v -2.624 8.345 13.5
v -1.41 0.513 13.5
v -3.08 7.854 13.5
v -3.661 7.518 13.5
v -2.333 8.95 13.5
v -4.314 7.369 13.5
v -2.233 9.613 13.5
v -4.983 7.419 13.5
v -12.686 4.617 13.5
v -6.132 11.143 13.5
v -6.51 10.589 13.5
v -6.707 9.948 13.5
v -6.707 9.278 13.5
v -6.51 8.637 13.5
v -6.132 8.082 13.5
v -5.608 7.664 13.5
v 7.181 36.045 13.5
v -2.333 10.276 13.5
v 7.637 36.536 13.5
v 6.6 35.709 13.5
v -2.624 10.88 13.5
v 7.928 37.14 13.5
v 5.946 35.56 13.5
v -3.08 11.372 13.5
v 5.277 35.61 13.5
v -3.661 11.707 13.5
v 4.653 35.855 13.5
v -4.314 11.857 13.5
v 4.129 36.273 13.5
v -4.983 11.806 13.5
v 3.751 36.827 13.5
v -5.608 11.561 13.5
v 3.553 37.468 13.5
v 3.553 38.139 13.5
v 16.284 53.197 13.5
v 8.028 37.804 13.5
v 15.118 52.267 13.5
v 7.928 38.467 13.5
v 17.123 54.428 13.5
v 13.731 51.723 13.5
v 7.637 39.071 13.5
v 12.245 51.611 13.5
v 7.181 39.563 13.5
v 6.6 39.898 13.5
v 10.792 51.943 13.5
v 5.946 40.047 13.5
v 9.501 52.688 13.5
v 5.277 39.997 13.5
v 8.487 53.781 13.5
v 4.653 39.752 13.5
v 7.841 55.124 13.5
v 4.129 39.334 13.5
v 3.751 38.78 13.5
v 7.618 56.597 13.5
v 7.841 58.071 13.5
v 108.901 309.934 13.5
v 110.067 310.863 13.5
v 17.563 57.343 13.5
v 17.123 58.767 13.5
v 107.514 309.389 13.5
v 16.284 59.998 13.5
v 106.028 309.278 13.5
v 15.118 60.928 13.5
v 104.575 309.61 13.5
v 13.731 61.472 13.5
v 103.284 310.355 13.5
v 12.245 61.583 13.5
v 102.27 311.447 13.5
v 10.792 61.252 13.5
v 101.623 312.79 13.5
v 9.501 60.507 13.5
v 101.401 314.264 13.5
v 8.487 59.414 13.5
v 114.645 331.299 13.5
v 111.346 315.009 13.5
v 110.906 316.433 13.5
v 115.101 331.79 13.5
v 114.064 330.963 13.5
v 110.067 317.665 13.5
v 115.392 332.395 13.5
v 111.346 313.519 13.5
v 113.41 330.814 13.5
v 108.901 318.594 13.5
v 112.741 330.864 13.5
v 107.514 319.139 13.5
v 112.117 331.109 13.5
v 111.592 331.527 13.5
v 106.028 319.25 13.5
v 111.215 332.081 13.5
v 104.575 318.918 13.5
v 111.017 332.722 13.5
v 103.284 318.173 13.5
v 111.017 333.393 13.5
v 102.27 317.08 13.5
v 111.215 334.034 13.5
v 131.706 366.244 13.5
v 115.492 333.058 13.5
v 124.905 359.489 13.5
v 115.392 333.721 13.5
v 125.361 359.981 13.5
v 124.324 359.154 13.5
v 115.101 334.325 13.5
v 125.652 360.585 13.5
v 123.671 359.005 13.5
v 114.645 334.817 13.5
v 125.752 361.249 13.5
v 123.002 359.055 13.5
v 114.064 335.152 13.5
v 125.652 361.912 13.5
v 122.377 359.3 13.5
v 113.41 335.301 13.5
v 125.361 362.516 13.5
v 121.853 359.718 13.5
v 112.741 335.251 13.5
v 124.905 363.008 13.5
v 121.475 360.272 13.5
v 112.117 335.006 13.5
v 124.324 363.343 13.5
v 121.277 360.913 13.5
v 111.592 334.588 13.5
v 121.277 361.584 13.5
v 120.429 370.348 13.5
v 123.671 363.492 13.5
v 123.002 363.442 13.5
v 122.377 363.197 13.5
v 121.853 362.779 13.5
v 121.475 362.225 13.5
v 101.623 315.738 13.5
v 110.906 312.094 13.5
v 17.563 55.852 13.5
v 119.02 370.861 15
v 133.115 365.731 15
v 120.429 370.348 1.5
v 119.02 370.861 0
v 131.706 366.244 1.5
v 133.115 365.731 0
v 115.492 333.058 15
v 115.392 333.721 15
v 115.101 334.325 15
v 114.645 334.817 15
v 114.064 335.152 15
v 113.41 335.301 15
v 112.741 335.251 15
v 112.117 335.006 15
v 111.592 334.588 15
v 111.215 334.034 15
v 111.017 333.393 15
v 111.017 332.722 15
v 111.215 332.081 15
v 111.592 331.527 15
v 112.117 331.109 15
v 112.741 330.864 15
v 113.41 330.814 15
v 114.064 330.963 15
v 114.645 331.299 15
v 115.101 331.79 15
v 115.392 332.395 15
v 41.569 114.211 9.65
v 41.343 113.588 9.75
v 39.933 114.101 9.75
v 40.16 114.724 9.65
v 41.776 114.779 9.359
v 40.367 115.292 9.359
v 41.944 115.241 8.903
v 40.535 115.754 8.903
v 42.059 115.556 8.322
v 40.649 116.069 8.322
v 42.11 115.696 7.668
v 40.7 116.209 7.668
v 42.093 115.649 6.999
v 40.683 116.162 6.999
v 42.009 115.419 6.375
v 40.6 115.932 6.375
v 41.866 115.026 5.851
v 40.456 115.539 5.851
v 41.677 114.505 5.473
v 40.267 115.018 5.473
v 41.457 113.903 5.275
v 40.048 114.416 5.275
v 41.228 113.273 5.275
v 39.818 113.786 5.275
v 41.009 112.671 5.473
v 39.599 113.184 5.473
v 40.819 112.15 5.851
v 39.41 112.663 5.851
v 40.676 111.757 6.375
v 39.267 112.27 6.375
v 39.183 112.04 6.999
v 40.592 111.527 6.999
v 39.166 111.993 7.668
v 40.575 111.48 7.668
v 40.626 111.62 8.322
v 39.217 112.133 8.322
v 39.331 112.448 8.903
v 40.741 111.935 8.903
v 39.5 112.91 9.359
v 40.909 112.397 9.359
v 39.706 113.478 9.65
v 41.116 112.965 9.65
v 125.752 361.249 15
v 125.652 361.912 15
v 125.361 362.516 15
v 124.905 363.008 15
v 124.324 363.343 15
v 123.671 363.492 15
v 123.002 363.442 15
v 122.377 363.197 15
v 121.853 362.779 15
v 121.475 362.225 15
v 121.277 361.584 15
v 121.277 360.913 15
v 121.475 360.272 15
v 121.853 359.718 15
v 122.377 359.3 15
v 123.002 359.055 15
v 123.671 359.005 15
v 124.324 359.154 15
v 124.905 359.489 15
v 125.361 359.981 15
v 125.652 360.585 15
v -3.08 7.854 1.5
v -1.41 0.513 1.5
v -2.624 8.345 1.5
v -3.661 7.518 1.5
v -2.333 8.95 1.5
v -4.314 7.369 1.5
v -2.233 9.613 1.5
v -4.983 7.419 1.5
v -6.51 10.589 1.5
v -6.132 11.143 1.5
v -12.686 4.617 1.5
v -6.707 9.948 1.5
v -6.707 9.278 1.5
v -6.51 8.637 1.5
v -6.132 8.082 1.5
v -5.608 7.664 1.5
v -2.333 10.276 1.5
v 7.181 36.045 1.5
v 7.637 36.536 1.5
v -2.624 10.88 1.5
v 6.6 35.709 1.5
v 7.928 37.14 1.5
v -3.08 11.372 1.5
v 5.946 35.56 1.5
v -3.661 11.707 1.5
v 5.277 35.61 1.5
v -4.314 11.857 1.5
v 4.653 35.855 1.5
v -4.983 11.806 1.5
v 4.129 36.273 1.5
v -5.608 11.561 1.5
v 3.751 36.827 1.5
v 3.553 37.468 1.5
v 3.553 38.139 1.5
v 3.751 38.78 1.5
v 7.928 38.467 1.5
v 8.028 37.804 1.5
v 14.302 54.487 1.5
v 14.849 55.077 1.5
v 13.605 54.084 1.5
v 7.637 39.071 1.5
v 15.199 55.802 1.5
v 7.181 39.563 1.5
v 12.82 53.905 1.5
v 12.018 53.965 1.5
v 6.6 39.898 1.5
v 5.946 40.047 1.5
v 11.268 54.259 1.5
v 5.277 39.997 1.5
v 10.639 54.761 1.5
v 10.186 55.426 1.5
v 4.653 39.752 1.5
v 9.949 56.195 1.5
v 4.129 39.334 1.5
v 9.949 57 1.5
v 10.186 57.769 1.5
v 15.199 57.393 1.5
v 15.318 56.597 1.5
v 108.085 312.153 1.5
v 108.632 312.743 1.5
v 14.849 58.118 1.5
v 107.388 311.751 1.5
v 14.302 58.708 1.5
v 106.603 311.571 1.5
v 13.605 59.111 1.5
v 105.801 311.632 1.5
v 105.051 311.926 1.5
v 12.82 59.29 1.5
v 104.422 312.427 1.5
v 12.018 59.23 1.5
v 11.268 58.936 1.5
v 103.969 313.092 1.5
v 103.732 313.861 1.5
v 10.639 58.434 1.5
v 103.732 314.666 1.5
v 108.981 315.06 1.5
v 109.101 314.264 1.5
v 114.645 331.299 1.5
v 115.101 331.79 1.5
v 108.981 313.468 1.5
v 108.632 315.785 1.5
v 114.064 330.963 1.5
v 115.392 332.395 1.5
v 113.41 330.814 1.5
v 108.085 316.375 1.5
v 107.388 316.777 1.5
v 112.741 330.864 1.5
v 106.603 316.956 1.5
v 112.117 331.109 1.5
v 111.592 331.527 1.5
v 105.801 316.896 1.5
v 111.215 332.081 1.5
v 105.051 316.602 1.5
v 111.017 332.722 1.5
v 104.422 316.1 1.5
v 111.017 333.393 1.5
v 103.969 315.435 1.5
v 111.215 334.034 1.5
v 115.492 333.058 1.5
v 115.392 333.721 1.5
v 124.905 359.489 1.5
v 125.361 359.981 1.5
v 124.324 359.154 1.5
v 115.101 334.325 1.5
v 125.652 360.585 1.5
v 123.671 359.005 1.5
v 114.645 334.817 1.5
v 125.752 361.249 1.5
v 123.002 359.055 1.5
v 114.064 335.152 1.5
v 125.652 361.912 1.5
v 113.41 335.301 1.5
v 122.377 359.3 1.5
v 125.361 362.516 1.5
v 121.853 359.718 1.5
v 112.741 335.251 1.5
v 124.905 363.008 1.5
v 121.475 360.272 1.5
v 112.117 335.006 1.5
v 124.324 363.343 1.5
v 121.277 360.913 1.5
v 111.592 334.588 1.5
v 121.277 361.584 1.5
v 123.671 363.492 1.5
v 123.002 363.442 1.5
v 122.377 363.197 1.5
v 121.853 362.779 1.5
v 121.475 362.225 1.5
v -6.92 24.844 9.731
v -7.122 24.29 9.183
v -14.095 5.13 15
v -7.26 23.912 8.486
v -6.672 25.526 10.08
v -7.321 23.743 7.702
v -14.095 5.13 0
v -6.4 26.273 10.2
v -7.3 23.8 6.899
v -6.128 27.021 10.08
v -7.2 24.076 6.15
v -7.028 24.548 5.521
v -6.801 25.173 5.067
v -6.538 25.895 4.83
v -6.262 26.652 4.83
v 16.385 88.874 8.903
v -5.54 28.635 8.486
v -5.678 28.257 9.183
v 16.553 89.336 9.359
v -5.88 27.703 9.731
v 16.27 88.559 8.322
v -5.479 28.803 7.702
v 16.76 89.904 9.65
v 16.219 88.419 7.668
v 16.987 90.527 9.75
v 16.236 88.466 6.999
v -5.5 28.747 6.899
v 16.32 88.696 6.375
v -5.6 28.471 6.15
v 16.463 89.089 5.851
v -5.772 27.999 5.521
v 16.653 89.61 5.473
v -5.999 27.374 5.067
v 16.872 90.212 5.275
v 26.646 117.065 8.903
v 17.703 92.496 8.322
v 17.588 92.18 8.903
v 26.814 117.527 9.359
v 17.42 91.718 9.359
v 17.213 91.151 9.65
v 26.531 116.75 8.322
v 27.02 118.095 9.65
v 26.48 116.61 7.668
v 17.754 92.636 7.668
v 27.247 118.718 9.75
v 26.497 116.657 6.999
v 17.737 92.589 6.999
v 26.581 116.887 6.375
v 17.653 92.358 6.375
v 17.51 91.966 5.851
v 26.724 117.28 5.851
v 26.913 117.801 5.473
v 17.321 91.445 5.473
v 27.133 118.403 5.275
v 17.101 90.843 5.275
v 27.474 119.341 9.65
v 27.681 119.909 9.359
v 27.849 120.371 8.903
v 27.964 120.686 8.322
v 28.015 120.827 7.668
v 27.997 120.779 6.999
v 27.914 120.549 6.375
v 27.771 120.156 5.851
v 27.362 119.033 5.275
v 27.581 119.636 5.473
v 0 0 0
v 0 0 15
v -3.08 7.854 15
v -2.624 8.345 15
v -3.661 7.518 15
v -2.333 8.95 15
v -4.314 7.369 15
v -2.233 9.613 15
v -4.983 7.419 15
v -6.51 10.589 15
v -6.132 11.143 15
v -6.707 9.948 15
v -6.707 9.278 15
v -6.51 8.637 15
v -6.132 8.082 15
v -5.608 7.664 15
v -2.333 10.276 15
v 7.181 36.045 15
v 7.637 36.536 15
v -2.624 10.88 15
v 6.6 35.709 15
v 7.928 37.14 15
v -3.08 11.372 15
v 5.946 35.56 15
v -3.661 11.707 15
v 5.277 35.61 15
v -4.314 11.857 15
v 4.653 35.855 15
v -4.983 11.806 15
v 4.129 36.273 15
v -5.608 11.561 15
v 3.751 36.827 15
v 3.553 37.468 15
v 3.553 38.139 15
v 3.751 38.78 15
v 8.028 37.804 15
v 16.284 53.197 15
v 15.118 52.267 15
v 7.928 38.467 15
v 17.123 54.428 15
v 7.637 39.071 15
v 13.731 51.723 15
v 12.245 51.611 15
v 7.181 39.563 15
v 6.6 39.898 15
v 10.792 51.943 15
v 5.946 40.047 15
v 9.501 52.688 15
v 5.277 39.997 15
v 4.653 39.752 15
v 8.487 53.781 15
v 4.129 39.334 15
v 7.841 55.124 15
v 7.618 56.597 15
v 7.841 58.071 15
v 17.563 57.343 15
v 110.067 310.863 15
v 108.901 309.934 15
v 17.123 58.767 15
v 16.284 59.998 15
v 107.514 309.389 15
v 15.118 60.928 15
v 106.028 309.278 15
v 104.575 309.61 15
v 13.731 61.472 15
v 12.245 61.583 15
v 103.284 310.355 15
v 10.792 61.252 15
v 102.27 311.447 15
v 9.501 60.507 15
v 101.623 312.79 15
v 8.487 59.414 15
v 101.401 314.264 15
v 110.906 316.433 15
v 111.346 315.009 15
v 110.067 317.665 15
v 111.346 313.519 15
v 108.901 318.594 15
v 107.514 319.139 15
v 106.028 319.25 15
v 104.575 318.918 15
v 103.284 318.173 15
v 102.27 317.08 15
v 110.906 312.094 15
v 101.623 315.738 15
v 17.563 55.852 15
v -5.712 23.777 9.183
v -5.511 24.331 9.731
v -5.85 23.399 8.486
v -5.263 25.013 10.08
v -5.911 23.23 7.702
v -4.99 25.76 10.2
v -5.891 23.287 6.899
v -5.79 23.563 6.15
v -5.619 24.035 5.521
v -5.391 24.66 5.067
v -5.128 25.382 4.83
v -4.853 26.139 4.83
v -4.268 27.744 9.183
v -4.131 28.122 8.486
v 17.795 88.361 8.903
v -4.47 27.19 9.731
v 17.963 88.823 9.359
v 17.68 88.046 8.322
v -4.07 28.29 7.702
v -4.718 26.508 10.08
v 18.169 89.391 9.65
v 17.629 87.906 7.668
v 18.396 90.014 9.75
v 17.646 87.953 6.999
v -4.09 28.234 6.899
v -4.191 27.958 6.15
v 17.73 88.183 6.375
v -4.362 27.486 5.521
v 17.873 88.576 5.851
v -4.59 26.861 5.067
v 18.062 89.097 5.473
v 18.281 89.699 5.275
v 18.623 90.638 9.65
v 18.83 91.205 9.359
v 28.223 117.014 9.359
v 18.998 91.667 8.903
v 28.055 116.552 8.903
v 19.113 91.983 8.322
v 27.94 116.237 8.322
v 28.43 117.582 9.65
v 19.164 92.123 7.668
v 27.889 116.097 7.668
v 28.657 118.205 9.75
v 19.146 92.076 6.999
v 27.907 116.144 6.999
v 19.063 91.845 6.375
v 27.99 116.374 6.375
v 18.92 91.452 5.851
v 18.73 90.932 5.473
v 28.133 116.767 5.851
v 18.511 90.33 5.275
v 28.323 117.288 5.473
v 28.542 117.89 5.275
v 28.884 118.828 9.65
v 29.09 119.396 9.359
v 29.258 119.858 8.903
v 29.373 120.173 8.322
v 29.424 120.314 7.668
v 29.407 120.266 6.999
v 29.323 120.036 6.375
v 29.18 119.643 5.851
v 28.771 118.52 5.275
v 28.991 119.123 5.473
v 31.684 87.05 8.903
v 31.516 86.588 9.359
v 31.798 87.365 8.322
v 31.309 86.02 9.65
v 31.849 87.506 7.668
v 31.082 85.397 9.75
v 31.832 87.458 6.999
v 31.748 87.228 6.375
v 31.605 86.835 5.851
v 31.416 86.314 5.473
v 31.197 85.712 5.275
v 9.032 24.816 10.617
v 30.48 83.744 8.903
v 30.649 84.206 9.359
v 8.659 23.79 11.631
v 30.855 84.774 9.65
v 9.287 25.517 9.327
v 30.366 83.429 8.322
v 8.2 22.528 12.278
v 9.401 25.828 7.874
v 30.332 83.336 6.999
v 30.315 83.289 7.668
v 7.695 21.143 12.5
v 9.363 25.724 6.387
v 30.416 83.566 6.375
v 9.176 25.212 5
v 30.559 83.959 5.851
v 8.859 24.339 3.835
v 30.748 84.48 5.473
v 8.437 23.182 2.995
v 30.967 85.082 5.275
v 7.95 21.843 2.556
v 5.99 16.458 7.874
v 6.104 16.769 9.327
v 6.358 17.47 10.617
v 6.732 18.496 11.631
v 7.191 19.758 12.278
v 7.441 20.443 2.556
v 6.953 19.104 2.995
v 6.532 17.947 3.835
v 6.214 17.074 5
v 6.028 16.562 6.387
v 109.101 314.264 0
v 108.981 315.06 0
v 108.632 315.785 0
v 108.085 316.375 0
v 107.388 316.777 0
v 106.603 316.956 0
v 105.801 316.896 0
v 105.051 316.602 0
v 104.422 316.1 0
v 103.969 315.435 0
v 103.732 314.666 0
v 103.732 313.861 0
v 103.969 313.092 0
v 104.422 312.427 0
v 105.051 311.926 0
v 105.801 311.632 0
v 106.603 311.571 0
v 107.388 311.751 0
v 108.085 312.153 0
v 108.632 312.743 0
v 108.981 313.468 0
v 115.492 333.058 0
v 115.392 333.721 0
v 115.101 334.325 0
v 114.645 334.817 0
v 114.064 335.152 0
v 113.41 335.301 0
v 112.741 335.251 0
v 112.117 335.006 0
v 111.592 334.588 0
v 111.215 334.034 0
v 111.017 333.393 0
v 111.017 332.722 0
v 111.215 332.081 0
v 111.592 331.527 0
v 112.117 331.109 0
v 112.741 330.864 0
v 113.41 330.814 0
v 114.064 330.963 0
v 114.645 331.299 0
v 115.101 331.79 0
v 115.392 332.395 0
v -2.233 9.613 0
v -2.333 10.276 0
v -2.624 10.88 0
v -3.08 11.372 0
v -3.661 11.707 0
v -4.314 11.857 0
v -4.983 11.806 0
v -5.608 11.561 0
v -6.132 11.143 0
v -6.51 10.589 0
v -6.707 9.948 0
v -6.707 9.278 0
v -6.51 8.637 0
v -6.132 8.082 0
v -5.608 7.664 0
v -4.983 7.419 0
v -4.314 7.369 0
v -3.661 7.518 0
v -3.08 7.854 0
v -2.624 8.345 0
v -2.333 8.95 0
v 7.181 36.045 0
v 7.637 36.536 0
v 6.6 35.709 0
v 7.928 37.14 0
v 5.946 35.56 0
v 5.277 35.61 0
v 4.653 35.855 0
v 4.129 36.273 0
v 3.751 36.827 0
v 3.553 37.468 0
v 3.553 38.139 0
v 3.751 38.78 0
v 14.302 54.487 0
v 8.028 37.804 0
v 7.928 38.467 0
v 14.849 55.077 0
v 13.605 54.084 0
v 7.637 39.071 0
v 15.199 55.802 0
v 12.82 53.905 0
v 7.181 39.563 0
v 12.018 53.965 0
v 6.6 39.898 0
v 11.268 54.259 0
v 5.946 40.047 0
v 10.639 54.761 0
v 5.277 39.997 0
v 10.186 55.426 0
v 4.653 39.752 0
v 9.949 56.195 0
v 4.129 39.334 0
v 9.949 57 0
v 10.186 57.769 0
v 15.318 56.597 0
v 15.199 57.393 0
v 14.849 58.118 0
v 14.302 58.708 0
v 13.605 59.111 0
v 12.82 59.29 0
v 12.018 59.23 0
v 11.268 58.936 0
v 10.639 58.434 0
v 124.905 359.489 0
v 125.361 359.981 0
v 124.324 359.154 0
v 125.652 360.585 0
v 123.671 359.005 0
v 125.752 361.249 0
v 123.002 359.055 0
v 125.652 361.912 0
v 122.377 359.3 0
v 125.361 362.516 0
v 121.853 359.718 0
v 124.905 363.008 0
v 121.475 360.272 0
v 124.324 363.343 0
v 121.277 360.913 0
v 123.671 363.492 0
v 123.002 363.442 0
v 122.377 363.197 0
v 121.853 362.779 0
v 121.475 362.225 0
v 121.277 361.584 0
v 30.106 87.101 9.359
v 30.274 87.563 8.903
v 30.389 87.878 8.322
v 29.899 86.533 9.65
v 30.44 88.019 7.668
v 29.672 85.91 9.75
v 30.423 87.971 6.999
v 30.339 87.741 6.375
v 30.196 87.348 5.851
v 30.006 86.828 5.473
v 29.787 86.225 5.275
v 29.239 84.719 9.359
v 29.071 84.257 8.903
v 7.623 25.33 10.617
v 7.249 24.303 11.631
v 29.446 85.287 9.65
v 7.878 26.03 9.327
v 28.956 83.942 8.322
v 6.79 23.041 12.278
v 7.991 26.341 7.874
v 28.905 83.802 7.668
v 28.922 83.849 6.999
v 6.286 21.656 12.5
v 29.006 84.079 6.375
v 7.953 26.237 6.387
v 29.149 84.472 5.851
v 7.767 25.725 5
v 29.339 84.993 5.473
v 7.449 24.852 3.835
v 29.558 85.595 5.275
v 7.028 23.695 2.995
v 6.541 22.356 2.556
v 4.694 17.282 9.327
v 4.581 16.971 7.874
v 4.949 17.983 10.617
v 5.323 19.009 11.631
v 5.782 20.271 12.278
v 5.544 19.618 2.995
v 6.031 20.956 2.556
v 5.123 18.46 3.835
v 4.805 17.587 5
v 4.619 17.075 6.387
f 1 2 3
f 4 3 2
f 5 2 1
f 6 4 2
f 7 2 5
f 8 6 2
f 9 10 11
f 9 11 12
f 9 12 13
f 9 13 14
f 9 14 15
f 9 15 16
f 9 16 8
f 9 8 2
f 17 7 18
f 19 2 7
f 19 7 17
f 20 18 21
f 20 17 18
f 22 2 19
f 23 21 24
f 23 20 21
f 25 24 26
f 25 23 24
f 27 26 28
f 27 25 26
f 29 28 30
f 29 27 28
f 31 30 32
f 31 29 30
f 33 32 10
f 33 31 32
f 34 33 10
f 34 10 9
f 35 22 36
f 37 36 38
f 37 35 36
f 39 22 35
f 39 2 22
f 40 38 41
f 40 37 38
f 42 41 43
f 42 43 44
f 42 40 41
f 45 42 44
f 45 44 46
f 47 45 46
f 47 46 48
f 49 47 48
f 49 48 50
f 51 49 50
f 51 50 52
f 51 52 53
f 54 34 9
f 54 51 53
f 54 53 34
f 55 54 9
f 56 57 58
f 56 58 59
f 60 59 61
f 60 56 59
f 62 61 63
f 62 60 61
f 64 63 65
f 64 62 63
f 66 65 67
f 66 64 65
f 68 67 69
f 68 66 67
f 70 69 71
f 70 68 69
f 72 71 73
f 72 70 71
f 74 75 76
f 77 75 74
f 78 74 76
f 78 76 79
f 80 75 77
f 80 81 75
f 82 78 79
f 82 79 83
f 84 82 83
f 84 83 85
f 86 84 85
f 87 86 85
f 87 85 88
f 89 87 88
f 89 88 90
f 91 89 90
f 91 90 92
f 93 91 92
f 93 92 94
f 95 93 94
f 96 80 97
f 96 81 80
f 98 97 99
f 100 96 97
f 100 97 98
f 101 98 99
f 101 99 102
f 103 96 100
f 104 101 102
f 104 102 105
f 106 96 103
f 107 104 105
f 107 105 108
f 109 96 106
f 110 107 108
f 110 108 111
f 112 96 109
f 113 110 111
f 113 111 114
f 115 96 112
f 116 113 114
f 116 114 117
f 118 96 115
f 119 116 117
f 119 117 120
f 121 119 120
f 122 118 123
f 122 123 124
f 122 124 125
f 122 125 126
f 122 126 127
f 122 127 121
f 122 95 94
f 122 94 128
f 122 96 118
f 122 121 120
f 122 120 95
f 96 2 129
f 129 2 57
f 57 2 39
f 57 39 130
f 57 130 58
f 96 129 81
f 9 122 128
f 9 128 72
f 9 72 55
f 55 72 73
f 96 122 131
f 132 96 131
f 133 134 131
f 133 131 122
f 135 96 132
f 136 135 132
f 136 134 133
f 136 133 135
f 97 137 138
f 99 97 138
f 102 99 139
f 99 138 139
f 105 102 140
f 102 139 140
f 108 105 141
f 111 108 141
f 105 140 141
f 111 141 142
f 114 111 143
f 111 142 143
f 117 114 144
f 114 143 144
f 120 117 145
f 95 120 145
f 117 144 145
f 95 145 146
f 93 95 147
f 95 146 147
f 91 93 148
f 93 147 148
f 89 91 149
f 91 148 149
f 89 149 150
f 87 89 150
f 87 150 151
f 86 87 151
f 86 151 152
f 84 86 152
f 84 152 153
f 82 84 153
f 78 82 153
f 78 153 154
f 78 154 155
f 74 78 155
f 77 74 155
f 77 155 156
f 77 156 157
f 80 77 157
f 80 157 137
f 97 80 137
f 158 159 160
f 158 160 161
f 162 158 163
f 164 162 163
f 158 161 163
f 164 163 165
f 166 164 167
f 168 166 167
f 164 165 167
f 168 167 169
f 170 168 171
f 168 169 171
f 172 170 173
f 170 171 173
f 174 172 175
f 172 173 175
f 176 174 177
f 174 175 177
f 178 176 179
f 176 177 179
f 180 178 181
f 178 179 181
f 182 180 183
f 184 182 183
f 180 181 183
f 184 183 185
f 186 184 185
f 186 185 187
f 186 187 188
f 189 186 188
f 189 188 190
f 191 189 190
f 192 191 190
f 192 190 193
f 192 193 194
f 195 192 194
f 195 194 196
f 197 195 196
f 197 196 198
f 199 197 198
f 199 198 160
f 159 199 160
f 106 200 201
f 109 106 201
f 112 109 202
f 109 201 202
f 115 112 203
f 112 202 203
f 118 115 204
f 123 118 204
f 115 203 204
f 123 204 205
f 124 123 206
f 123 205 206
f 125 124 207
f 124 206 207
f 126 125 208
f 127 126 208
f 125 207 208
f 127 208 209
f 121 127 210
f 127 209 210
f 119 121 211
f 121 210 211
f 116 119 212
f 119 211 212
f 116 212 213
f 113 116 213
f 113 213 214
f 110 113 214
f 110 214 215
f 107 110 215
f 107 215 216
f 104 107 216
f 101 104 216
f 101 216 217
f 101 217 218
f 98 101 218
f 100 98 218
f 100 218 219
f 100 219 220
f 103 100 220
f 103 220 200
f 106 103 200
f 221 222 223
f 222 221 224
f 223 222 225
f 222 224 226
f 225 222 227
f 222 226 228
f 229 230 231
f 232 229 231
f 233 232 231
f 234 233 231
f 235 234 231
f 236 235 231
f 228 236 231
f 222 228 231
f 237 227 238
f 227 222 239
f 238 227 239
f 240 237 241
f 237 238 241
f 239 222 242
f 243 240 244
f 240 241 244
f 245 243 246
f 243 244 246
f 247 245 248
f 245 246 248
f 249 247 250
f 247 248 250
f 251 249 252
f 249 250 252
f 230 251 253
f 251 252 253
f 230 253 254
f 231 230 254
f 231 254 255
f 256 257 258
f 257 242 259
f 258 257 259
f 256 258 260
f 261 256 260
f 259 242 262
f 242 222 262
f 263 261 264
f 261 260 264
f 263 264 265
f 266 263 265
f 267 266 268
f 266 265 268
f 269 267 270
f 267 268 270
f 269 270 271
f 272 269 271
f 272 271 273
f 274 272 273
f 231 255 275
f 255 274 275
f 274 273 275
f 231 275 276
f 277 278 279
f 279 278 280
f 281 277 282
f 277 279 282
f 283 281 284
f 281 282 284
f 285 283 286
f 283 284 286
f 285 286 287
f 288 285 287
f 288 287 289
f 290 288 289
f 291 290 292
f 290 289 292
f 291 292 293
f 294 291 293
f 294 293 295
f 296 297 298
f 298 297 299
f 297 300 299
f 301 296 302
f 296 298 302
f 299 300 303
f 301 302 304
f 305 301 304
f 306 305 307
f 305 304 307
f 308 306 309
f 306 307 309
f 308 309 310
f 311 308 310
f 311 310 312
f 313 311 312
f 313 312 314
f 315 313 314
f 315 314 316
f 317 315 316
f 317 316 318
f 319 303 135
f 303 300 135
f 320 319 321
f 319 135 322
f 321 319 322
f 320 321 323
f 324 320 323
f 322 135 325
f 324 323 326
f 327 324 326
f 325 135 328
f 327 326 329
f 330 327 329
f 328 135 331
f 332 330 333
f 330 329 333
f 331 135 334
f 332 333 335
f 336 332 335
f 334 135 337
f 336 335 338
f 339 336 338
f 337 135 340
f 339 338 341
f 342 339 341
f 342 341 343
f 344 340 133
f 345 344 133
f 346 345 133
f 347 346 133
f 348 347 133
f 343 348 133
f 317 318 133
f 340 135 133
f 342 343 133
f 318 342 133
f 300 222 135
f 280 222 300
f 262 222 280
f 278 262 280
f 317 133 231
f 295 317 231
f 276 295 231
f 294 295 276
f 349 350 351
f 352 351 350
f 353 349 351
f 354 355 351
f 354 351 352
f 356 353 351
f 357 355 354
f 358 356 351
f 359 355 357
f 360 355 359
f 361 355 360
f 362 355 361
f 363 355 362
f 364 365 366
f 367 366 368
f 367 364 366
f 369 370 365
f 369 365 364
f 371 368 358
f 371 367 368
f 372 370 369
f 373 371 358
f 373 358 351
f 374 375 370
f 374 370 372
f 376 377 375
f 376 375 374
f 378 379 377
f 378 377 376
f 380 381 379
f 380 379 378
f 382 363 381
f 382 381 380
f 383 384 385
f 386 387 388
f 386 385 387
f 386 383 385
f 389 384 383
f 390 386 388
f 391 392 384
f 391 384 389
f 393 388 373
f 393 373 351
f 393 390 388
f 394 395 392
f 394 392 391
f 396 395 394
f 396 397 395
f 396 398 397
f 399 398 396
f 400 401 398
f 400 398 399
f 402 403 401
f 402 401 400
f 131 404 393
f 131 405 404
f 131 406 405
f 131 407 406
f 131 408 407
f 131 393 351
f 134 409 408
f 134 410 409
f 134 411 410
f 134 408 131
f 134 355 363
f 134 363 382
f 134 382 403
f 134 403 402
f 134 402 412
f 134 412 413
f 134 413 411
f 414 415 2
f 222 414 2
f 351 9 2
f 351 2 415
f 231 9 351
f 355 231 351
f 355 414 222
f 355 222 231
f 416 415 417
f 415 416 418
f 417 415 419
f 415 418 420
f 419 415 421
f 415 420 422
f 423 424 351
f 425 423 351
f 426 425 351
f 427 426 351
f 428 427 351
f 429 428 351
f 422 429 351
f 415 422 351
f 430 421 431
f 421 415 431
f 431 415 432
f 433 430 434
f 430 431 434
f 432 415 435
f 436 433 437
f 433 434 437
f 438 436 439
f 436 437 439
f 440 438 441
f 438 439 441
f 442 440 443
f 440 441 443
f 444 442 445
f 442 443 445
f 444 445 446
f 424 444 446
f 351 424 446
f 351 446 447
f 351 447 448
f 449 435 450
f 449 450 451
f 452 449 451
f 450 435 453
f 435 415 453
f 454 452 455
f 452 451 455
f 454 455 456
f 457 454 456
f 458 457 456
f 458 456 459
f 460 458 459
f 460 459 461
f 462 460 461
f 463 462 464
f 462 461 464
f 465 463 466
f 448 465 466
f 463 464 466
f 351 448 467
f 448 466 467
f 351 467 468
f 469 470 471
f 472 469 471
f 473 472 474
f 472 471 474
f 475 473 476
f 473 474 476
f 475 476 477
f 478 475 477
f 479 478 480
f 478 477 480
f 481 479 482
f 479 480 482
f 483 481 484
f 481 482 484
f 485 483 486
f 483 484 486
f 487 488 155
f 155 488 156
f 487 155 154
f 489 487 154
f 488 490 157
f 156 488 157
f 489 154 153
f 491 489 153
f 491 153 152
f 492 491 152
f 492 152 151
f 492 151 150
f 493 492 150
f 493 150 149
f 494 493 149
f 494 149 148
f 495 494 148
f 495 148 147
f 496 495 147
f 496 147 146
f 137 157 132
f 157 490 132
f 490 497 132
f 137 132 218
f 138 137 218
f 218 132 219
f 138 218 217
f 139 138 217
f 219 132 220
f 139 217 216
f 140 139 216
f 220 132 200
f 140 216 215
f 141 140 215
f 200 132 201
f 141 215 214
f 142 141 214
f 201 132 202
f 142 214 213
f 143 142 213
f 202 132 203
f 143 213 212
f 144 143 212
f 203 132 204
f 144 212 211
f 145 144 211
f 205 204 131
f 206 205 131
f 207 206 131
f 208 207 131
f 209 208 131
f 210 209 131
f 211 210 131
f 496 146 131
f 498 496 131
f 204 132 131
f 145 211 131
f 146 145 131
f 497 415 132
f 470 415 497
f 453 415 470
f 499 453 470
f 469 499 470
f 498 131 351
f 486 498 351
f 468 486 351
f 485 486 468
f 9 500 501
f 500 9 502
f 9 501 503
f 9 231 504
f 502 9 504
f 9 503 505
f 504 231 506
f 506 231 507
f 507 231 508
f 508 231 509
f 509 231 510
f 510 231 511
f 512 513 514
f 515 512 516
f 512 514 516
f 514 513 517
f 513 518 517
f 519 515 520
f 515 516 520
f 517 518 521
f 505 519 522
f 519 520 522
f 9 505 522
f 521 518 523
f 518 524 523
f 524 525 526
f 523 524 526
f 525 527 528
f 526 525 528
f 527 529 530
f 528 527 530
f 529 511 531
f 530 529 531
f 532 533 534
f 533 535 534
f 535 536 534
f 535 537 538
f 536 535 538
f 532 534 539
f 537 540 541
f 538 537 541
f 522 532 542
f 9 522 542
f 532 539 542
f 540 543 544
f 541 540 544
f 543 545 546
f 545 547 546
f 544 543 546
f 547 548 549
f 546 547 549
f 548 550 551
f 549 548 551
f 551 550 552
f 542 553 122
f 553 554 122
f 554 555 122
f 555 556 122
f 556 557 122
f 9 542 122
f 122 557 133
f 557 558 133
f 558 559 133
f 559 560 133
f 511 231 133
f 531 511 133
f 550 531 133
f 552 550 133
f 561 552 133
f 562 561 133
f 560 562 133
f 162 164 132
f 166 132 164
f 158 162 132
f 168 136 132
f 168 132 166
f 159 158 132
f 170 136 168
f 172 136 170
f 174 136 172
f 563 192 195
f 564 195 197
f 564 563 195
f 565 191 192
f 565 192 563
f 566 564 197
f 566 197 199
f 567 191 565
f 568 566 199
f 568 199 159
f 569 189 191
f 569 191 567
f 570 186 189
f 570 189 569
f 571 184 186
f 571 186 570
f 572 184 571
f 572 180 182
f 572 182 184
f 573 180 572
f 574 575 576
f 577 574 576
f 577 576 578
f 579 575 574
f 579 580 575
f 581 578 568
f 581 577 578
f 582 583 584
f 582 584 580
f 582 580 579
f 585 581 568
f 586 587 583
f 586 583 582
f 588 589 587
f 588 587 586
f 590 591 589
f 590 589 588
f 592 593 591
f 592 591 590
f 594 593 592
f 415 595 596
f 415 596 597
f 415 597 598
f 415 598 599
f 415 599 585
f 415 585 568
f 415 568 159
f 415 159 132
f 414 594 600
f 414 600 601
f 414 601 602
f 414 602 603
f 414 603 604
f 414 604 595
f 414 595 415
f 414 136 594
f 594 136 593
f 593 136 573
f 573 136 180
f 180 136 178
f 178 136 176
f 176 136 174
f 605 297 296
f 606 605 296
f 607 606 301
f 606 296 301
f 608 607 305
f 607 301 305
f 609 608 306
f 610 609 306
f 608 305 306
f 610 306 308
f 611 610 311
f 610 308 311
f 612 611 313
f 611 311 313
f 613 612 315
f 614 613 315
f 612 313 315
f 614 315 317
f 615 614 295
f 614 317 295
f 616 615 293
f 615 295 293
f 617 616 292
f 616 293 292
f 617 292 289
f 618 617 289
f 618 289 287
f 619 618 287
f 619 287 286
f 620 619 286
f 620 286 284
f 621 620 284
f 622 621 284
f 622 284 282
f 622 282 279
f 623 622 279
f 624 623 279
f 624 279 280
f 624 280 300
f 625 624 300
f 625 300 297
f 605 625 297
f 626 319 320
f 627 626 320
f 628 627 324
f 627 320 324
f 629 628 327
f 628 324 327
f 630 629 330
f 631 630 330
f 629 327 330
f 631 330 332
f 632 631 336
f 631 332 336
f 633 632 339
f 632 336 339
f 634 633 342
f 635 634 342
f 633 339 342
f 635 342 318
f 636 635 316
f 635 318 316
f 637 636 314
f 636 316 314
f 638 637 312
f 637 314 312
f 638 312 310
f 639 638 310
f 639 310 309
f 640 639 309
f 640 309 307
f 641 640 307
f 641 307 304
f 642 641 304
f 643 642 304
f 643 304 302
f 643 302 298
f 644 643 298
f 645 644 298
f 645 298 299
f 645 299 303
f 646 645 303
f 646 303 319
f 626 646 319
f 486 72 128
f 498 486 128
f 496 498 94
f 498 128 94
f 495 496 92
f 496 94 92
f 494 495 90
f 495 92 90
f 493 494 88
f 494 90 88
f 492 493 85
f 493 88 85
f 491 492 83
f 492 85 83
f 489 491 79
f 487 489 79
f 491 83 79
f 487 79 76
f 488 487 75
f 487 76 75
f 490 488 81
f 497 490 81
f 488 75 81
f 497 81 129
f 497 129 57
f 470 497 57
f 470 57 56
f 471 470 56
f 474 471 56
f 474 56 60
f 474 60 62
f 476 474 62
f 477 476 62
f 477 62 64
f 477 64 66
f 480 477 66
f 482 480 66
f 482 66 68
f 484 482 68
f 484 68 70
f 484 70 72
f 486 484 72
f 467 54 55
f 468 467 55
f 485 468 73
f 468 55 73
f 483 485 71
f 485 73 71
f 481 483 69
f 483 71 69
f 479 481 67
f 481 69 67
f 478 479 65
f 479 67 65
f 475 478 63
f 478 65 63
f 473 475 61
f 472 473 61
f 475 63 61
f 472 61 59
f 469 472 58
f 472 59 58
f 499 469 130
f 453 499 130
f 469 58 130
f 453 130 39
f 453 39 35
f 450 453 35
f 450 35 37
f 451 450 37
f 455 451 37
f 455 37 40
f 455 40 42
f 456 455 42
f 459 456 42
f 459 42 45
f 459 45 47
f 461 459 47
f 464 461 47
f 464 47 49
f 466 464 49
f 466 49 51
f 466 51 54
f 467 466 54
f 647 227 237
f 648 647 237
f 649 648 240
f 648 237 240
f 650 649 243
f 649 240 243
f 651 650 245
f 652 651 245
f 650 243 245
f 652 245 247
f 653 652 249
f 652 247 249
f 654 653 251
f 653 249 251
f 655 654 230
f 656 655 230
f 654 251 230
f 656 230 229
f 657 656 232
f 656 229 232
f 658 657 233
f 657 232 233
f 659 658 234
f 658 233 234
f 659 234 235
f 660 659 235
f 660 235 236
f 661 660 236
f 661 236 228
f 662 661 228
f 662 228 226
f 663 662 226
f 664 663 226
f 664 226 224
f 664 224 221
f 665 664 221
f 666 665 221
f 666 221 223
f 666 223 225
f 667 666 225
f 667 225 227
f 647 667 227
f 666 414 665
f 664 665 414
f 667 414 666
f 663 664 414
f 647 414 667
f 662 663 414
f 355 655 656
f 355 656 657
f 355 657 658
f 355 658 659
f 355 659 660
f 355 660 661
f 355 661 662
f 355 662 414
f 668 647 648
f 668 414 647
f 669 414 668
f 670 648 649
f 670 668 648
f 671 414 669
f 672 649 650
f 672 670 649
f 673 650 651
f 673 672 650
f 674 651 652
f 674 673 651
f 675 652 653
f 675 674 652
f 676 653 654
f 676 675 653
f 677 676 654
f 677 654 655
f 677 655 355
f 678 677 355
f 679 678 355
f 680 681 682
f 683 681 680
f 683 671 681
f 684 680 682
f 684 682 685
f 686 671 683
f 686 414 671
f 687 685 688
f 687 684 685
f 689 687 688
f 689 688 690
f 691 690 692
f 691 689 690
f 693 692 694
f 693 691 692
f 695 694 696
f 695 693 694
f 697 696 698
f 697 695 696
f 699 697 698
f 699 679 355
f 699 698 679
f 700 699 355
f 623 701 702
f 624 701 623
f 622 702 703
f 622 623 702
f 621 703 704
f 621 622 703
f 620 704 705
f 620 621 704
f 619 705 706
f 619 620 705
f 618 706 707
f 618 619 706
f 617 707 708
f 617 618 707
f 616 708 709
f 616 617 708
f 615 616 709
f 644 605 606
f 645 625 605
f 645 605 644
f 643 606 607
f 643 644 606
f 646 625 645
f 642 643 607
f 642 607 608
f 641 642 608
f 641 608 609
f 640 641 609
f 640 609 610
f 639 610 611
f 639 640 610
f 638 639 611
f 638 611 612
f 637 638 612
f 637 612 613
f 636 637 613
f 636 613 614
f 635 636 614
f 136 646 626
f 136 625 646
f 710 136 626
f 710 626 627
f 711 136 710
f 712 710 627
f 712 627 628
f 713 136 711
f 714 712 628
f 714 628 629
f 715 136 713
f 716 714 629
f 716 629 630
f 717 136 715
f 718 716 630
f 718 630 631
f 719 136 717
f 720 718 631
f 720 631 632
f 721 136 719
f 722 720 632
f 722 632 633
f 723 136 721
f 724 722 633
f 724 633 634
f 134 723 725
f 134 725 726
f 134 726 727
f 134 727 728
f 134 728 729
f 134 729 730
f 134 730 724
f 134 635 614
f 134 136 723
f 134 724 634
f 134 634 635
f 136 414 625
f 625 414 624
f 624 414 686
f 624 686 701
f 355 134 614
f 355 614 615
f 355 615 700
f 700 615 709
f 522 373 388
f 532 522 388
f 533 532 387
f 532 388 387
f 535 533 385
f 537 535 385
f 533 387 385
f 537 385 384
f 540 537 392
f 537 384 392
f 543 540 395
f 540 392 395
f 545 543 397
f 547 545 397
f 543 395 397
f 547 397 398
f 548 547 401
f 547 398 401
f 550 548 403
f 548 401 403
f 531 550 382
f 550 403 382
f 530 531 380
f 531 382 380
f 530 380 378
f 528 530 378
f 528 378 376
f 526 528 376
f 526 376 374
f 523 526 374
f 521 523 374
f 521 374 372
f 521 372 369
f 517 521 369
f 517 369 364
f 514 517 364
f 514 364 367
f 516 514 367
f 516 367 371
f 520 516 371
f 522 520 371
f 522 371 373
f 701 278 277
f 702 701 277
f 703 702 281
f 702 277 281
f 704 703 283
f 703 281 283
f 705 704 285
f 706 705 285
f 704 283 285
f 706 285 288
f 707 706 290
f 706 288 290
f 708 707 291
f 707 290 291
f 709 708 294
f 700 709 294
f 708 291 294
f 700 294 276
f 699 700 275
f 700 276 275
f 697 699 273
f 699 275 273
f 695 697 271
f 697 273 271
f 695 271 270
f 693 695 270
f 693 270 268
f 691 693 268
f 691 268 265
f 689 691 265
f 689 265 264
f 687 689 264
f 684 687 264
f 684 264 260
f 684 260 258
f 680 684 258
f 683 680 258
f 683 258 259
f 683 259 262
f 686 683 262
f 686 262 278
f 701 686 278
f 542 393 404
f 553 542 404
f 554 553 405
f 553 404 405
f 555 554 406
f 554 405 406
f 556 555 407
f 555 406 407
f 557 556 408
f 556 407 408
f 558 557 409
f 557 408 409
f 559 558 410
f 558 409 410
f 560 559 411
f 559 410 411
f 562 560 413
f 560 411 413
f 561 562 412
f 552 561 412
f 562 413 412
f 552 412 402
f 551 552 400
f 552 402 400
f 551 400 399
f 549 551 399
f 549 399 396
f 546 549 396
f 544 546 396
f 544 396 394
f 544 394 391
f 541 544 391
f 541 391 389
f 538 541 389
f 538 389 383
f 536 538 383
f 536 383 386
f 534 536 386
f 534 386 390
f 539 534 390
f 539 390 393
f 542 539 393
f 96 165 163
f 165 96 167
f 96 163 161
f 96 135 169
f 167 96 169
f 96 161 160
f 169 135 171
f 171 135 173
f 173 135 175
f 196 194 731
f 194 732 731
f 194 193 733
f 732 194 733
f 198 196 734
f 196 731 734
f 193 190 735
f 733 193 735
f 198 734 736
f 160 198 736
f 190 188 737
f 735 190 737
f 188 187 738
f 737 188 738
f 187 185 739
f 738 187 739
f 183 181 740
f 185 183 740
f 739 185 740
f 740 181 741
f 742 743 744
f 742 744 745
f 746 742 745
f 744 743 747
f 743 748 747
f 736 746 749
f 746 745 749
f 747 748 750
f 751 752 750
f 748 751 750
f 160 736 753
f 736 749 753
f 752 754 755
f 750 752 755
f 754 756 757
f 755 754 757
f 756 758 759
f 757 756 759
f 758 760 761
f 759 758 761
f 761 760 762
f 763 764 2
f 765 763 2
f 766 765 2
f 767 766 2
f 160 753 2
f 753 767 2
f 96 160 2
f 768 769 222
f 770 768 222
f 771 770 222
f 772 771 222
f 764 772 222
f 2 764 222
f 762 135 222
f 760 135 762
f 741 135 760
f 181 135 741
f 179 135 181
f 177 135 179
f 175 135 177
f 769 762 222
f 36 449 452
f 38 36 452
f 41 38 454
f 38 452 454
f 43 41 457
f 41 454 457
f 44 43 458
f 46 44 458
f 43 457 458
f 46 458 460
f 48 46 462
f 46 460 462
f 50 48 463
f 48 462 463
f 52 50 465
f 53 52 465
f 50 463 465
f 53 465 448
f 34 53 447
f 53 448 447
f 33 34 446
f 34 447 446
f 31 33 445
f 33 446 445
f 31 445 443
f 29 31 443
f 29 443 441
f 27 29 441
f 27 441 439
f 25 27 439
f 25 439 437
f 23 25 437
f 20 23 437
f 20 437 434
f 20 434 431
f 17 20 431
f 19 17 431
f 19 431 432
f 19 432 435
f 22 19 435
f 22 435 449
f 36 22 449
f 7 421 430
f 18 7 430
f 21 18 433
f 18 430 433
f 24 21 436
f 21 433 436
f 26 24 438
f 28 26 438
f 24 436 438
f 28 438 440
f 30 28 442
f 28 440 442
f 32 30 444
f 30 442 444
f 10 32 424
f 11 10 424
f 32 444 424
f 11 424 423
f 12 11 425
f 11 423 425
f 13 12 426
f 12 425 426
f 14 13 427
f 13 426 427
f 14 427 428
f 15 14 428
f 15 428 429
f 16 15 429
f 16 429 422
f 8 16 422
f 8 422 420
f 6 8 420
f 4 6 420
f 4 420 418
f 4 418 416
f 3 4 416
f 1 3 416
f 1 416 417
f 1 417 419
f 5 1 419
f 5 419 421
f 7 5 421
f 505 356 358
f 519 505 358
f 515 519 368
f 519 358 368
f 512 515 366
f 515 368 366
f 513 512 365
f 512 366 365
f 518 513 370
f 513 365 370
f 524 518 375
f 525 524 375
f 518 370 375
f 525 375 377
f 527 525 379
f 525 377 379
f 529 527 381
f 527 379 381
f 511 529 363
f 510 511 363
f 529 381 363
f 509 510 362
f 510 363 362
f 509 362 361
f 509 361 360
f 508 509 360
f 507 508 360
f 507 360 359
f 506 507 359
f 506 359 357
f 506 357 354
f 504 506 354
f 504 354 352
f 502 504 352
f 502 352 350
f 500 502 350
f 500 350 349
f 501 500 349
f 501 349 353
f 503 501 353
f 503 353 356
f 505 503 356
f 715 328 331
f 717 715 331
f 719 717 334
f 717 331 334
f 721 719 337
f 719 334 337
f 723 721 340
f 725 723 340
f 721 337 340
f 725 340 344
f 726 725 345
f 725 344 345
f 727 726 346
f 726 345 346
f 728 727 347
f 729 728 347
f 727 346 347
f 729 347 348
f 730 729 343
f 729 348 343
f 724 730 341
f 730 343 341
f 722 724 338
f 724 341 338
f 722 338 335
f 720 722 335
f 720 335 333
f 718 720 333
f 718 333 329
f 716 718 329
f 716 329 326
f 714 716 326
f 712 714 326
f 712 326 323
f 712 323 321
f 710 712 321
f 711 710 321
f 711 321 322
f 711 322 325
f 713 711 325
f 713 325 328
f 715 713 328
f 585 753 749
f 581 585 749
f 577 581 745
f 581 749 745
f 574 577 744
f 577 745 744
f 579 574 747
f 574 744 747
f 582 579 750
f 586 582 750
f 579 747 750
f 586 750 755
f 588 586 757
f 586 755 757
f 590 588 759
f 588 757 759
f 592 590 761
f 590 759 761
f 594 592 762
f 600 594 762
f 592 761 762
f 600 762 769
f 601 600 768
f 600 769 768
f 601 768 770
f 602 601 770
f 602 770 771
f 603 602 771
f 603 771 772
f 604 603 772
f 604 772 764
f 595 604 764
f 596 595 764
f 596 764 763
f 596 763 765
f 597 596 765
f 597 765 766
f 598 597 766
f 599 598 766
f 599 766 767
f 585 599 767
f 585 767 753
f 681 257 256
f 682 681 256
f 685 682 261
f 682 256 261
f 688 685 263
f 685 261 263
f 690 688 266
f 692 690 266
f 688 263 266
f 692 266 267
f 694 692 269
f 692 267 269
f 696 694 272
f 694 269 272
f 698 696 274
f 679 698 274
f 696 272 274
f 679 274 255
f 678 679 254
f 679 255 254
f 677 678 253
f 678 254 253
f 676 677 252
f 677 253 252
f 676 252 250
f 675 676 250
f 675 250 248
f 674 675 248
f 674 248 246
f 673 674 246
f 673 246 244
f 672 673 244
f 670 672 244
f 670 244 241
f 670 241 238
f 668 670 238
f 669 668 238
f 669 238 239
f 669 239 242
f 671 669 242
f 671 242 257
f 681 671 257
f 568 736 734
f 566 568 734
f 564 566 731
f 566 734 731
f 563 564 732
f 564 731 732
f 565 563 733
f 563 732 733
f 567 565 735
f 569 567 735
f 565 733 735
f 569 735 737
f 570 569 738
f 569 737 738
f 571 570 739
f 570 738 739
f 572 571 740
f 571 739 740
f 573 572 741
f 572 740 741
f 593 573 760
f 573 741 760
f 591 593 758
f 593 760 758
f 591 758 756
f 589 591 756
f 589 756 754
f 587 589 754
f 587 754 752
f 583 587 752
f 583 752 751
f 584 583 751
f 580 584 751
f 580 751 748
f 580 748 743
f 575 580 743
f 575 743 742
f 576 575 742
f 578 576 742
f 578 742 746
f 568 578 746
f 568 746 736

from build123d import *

# Parameters (mm, degrees)
EXTRUDE_1_DEPTH             = 15
SHELL_1_T                   = -1.5
SKETCH_3_R                  = 2.25
SKETCH_3_R_2                = 2.7
CUT_EXTRUDE_1_DEPTH         = 25
SKETCH_5_R                  = 2.25
SKETCH_5_R_2                = 2.7
CUT_EXTRUDE_3_DEPTH         = 20
HOLE_WIZARD_10_0_10_1_D     = 10
HOLE_WIZARD_10_0_10_1_DEPTH = 1.5
HOLE_WIZARD_10_0_10_2_D     = 10
HOLE_WIZARD_10_0_10_2_DEPTH = 1.5


with BuildPart() as part:
    # ｽｹｯﾁ1 → ﾎﾞｽ - 押し出し1 (new body)
    with BuildSketch(Plane.XY):
        Polygon((133.1152144, 365.731045751), (0, 0), (-14.095389312, 5.13030215), (119.019825089, 370.861347901), align=None)
    extrude(amount=EXTRUDE_1_DEPTH)

    # ｼｪﾙ1
    shell_1_openings = [part.faces().sort_by_distance(p)[0] for p in [
        (126.067519744, 368.296196826, 7.5),
        (-7.047694656, 2.565151075, 7.5),
    ]]
    offset(amount=SHELL_1_T, openings=shell_1_openings, kind=Kind.INTERSECTION)

    # ｽｹｯﾁ3 → ｶｯﾄ - 押し出し1 (cut)
    with BuildSketch(Plane.XY.offset(15)):
        with Locations((-4.482543581, 9.612845731)):
            Circle(SKETCH_3_R)
        with Locations((123.50236867, 361.24850217)):
            Circle(SKETCH_3_R)
        with Locations((113.24176437, 333.057723546)):
            Circle(SKETCH_3_R)
        with Locations((5.778060719, 37.803624354)):
            Circle(SKETCH_3_R)
        with Locations((12.618463585, 56.59747677)):
            Circle(SKETCH_3_R_2)
        with Locations((106.401361503, 314.263871131)):
            Circle(SKETCH_3_R_2)
    extrude(amount=-CUT_EXTRUDE_1_DEPTH, mode=Mode.SUBTRACT)

    # ｽｹｯﾁ5 → ｶｯﾄ - 押し出し3 (cut)
    with BuildSketch(Plane(origin=(-14.095389312, 5.13030215, 0), x_dir=(0, 0, 1), z_dir=(-0.939692621, 0.342020143, 0))):
        with Locations((7.5, 120.877716811)):
            Circle(SKETCH_5_R)
        with Locations((7.5, 90.877716811)):
            Circle(SKETCH_5_R)
        with Locations((7.5, 22.5)):
            Circle(SKETCH_5_R_2)
    extrude(amount=-CUT_EXTRUDE_3_DEPTH, mode=Mode.SUBTRACT)

    # Ø10.0 (10) 直径の穴1
    with Locations(Plane(origin=(0, 0, 0), x_dir=(0, 0, -1), z_dir=(0.939692621, -0.342020143, 0))):
        with Locations((-7.5, 22.5)):
            Hole(HOLE_WIZARD_10_0_10_1_D / 2, depth=HOLE_WIZARD_10_0_10_1_DEPTH)

    # Ø10.0 (10) 直径の穴2
    with Locations(Plane.XY.offset(15)):
        with Locations((106.401361503, 314.263871131), (12.618463585, 56.59747677)):
            Hole(HOLE_WIZARD_10_0_10_2_D / 2, depth=HOLE_WIZARD_10_0_10_2_DEPTH)


solid = part.part
